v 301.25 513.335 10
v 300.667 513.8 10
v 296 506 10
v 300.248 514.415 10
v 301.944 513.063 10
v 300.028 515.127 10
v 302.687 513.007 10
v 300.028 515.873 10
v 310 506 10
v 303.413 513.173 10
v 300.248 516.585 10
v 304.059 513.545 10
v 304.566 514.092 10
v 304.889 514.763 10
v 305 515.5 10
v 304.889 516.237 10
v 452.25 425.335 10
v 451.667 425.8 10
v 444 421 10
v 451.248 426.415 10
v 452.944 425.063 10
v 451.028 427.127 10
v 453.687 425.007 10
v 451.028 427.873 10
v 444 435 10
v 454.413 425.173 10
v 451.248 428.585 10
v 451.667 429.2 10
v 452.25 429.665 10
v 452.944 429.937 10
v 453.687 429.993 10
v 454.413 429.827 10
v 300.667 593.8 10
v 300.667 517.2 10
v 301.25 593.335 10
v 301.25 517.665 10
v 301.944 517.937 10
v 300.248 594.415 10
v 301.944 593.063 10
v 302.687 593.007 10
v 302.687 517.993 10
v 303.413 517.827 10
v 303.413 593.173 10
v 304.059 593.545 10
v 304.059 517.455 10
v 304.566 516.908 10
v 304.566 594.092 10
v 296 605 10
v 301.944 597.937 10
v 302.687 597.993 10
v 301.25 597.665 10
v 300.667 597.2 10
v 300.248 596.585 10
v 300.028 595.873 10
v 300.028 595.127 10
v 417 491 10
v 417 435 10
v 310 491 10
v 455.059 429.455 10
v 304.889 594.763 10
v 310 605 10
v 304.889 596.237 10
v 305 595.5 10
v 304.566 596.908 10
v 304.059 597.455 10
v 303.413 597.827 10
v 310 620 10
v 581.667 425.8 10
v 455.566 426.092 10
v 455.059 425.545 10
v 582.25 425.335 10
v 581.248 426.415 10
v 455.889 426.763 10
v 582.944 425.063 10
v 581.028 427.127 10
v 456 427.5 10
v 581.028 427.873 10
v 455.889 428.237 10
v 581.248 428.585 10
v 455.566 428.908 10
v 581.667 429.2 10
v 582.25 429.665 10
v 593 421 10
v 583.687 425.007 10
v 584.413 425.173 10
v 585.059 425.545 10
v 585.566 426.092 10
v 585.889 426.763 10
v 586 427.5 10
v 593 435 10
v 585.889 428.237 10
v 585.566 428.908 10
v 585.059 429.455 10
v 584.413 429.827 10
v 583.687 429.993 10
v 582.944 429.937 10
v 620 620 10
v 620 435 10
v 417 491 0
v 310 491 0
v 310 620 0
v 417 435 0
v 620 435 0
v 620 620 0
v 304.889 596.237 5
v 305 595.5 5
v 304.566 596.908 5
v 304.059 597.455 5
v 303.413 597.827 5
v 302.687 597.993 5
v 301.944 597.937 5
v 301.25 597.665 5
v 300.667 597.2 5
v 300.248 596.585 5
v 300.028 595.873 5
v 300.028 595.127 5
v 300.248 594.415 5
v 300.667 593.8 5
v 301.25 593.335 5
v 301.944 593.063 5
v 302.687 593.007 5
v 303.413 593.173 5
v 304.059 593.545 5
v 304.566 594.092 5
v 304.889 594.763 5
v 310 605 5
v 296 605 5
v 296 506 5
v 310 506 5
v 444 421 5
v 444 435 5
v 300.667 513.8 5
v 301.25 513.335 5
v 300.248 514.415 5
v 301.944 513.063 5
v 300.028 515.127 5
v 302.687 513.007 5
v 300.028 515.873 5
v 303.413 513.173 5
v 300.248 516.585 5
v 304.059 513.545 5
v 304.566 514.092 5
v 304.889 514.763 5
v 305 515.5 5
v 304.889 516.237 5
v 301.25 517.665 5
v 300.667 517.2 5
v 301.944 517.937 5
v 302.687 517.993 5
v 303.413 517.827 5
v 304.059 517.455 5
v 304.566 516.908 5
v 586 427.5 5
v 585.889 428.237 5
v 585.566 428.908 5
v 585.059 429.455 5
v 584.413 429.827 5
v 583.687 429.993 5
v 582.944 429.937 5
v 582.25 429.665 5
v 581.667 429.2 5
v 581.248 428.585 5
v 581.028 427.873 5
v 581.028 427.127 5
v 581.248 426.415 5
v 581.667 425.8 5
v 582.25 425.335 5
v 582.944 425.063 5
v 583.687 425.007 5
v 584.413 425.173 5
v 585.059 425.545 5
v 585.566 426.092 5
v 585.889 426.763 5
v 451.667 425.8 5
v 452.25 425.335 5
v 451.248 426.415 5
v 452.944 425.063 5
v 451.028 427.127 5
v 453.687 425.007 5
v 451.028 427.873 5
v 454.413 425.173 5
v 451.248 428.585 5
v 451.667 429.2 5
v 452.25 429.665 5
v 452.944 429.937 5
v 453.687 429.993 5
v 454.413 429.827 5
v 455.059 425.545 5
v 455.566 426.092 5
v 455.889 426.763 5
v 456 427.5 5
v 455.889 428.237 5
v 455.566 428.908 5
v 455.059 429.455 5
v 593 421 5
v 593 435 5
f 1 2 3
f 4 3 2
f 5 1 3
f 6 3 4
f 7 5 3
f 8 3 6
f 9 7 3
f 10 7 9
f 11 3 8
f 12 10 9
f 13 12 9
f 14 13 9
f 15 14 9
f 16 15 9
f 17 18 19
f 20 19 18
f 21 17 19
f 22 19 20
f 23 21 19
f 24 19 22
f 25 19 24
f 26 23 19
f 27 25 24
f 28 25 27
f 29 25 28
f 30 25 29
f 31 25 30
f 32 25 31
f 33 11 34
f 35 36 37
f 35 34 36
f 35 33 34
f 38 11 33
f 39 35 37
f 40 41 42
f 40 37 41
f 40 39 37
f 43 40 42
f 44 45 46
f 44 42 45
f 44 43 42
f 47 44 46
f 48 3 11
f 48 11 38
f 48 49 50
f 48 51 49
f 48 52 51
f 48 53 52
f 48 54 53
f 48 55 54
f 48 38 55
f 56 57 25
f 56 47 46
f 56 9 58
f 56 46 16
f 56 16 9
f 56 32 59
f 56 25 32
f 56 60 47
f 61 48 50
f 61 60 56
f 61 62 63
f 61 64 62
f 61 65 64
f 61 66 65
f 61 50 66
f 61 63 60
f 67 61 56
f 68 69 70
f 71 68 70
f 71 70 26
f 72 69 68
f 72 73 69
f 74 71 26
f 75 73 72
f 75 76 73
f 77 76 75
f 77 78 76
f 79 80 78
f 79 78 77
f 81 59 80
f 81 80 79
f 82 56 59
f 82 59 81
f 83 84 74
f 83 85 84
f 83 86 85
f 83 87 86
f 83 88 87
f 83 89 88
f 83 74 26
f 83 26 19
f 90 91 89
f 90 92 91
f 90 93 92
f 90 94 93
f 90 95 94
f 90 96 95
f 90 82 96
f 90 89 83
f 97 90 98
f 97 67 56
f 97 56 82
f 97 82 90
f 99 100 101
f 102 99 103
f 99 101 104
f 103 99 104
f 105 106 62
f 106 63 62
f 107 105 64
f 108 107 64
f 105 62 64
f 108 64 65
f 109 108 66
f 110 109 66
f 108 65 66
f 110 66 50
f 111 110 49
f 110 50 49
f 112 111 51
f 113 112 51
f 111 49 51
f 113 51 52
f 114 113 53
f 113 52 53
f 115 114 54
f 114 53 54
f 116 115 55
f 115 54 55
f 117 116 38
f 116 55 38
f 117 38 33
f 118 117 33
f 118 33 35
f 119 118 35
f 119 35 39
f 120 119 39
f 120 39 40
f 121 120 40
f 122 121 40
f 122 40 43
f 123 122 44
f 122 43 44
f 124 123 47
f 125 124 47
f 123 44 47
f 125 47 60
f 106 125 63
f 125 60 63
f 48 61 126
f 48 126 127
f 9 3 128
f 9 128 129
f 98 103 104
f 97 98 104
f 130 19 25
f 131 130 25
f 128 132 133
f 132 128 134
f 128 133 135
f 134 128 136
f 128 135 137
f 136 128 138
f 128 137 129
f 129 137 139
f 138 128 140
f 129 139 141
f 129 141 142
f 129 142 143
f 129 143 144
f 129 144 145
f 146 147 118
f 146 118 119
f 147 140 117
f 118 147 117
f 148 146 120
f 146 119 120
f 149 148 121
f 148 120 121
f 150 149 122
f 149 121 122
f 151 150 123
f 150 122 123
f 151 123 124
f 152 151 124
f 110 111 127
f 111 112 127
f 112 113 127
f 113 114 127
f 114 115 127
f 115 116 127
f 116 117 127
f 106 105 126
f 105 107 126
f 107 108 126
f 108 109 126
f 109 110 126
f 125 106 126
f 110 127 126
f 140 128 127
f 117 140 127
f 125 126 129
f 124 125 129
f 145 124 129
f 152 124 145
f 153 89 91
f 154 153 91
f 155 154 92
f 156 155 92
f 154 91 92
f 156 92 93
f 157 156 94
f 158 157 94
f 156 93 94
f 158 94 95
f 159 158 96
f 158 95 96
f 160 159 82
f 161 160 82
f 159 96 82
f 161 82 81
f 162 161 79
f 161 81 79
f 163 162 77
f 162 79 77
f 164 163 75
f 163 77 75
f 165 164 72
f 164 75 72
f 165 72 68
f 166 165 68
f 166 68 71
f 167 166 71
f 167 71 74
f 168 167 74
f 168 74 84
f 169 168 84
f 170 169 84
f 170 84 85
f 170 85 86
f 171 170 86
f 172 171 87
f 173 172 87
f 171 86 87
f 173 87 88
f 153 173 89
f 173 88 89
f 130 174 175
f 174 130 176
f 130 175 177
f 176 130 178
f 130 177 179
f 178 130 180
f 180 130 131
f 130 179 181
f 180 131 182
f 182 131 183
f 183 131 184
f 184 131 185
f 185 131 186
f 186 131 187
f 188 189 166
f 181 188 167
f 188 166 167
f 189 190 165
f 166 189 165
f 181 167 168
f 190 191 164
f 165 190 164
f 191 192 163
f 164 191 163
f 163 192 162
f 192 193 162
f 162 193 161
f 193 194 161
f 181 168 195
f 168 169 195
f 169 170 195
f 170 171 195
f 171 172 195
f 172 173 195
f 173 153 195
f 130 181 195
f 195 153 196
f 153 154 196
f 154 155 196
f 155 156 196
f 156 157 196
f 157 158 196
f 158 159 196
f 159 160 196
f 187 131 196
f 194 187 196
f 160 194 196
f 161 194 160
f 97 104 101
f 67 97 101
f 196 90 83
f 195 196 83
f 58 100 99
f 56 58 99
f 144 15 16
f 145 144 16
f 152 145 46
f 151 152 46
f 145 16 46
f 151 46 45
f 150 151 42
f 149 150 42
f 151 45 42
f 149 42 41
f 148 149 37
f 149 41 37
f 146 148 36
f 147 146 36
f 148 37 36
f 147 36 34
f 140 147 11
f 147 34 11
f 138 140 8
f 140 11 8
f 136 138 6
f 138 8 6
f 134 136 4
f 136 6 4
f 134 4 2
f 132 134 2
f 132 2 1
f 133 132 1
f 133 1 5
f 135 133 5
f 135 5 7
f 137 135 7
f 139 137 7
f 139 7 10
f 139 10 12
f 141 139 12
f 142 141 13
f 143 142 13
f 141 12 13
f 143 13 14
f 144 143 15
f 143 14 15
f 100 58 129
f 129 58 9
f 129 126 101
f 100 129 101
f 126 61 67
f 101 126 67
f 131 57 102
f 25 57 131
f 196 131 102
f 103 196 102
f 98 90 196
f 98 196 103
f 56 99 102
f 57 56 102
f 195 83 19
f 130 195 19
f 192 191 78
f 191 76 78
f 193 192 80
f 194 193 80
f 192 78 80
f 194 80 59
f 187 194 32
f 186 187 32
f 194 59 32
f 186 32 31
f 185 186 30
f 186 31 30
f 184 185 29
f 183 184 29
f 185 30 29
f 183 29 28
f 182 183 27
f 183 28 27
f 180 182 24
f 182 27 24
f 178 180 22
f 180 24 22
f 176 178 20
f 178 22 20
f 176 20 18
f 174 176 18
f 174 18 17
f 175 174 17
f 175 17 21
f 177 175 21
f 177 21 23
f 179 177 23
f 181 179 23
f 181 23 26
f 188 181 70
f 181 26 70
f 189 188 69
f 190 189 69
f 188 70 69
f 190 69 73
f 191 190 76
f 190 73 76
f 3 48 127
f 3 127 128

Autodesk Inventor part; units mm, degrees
ref_plane "YZ Plane" through (0, 0, 0) normal (1, 0, 0) x (0, 1, 0)
ref_plane "XZ Plane" through (0, 0, 0) normal (0, 1, 0) x (-1, 0, 0)
ref_plane "XY Plane" through (0, 0, 0) normal (0, 0, 1) x (1, 0, 0)
sketch "Sketch1" plane through (0, 0, 0) normal (0, 0, 1) x (1, 0, 0)
  line L0 (0, 0) -> (620, 0)
  line L1 (620, 0) -> (620, 620)
  line L2 (620, 620) -> (0, 620)
  line L3 (0, 620) -> (0, 0)
  line L4 (203, 491) -> (417, 491)
  line L5 (417, 491) -> (417, 377)
  line L6 (417, 377) -> (203, 377)
  line L7 (203, 377) -> (203, 491)
  point P0 (310, 491)
  point P1 (310, 620)
  dimension "d0" = 620
  dimension "d1" = 620
  dimension "d2" = 214
  dimension "d3" = 114
  dimension "d4" = 129
extrude "Extrusion1" add sketch "Sketch1" along normal blind 10
sketch "Sketch2" plane through (0, 0, 10) normal (0, 0, 1) x (1, 0, 0)
  line L0 (0, 0) -> (310, 0)
  line L1 (310, 0) -> (310, 435)
  line L2 (310, 435) -> (0, 435)
  line L3 (0, 435) -> (0, 0)
  line L4 (620, 620) -> (0, 620) projected
  line L5 (0, 435) -> (620, 435)
  line L6 (620, 435) -> (620, 620)
  line L7 (620, 620) -> (0, 620)
  line L8 (0, 620) -> (0, 435)
  line L9 (310, 435) -> (620, 435)
  line L10 (620, 435) -> (620, 0)
  line L11 (620, 0) -> (310, 0)
  line L12 (310, 0) -> (310, 435)
  line L13 (0, 435) -> (310, 435)
  line L14 (310, 435) -> (310, 620)
  line L15 (310, 620) -> (0, 620)
  line L16 (0, 620) -> (0, 435)
  dimension "d7" = 435
extrude "Extrusion2" cut sketch "Sketch2" against normal through all contours L3 L2 L1 L0 | L1 L5 L10 L11 | L8 L4 L14 L2
sketch "Sketch6" plane through (0, 0, 10) normal (0, 0, 1) x (1, 0, 0)
  line L0 (310, 491) -> (310, 620) projected
  line L1 (310, 605) -> (296, 605)
  line L2 (296, 605) -> (296, 506)
  line L3 (296, 506) -> (310, 506)
  line L4 (310, 506) -> (310, 605)
  line L5 (417, 435) -> (620, 435) projected
  line L6 (444, 435) -> (593, 435)
  line L7 (593, 435) -> (593, 421)
  line L8 (593, 421) -> (444, 421)
  line L9 (444, 421) -> (444, 435)
  circle A0 centre (302.5, 595.5) radius 2.5
  circle A1 centre (302.5, 515.5) radius 2.5
  circle A2 centre (453.5, 427.5) radius 2.5
  circle A3 centre (583.5, 427.5) radius 2.5
  point P0 (0, 0)
  point P1 (310, 555.5)
  point P2 (518.5, 435)
  dimension "d28" = 14
  dimension "d29" = 99
  dimension "d30" = 149
  dimension "d31" = 14
  dimension "d32" = 5
  dimension "d33" = 5
  dimension "d34" = 9.5
  dimension "d35" = 9.5
  dimension "d36" = 7.5
  dimension "d37" = 7.5
  dimension "d38" = 5
  dimension "d39" = 5
  dimension "d40" = 9.5
  dimension "d41" = 9.5
  dimension "d42" = 7.5
  dimension "d43" = 7.5
extrude "Extrusion6" add sketch "Sketch6" against normal blind 5
properties part number "TC001b" material "ABS Plastic"
